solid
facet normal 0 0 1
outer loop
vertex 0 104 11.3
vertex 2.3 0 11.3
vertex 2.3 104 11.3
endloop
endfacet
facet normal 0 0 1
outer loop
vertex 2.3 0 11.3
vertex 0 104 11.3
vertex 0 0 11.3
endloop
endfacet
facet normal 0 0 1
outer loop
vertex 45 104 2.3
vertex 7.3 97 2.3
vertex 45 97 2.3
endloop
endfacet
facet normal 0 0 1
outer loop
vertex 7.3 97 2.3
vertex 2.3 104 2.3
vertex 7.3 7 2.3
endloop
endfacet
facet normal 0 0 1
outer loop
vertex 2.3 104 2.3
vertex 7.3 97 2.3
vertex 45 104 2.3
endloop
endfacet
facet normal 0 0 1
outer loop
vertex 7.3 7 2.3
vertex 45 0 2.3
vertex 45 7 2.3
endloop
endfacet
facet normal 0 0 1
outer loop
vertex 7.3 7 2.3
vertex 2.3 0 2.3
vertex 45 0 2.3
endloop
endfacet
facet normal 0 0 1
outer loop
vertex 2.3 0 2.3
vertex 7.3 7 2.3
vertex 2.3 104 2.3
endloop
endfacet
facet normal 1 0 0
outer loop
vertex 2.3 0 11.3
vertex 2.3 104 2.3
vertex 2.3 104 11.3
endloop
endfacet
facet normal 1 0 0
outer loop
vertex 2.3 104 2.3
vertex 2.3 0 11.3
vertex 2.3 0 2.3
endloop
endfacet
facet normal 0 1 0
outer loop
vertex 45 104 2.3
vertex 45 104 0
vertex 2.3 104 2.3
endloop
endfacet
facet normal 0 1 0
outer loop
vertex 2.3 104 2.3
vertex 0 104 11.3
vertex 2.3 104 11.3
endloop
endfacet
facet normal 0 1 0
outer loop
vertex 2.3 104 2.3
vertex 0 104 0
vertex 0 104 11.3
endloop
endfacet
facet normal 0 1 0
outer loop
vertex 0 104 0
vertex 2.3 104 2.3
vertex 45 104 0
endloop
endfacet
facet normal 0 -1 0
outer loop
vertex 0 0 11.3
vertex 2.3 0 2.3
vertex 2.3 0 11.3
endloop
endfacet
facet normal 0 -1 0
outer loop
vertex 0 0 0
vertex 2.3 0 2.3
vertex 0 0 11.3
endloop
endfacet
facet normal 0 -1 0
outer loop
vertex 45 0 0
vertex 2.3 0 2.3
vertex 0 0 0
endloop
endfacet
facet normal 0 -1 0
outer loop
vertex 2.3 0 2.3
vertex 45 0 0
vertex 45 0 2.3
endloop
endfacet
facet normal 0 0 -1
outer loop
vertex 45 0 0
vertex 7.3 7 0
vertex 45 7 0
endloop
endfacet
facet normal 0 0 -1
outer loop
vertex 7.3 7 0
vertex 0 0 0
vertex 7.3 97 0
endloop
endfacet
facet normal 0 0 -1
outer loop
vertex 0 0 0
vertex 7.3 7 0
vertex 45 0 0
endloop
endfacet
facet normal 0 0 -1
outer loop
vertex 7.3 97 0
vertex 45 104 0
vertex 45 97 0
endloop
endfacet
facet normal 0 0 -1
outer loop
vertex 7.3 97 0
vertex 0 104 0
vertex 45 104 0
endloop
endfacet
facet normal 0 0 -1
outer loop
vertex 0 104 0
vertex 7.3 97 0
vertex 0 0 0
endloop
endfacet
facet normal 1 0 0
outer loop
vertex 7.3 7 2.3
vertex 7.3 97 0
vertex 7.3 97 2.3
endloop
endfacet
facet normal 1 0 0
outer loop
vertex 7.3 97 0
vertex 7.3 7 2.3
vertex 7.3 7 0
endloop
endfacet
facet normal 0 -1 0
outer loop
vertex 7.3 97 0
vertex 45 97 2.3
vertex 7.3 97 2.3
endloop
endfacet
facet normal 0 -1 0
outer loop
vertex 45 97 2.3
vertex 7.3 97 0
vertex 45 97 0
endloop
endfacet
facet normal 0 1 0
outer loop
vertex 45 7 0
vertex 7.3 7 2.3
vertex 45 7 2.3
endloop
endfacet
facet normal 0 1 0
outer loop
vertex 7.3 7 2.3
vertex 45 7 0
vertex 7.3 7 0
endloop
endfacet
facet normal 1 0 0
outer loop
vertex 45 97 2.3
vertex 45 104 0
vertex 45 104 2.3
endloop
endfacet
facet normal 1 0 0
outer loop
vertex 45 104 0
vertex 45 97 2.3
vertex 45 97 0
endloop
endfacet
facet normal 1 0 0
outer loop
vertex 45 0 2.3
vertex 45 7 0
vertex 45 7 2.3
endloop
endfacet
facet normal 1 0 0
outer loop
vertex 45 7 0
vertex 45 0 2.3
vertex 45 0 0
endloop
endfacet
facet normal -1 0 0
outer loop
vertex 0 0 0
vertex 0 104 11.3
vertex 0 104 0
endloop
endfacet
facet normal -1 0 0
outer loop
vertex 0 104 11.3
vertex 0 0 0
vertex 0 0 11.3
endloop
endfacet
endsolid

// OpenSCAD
epaisseur_plaque = 2.3;
hauteur_support  = 9;

difference() {
    cube([45,104,epaisseur_plaque + hauteur_support]);
    union() {
        translate([epaisseur_plaque,0,epaisseur_plaque])
            cube([43,104,hauteur_support]);
        translate([epaisseur_plaque+5,7,0]) cube([40,90,epaisseur_plaque]);
    }
}
